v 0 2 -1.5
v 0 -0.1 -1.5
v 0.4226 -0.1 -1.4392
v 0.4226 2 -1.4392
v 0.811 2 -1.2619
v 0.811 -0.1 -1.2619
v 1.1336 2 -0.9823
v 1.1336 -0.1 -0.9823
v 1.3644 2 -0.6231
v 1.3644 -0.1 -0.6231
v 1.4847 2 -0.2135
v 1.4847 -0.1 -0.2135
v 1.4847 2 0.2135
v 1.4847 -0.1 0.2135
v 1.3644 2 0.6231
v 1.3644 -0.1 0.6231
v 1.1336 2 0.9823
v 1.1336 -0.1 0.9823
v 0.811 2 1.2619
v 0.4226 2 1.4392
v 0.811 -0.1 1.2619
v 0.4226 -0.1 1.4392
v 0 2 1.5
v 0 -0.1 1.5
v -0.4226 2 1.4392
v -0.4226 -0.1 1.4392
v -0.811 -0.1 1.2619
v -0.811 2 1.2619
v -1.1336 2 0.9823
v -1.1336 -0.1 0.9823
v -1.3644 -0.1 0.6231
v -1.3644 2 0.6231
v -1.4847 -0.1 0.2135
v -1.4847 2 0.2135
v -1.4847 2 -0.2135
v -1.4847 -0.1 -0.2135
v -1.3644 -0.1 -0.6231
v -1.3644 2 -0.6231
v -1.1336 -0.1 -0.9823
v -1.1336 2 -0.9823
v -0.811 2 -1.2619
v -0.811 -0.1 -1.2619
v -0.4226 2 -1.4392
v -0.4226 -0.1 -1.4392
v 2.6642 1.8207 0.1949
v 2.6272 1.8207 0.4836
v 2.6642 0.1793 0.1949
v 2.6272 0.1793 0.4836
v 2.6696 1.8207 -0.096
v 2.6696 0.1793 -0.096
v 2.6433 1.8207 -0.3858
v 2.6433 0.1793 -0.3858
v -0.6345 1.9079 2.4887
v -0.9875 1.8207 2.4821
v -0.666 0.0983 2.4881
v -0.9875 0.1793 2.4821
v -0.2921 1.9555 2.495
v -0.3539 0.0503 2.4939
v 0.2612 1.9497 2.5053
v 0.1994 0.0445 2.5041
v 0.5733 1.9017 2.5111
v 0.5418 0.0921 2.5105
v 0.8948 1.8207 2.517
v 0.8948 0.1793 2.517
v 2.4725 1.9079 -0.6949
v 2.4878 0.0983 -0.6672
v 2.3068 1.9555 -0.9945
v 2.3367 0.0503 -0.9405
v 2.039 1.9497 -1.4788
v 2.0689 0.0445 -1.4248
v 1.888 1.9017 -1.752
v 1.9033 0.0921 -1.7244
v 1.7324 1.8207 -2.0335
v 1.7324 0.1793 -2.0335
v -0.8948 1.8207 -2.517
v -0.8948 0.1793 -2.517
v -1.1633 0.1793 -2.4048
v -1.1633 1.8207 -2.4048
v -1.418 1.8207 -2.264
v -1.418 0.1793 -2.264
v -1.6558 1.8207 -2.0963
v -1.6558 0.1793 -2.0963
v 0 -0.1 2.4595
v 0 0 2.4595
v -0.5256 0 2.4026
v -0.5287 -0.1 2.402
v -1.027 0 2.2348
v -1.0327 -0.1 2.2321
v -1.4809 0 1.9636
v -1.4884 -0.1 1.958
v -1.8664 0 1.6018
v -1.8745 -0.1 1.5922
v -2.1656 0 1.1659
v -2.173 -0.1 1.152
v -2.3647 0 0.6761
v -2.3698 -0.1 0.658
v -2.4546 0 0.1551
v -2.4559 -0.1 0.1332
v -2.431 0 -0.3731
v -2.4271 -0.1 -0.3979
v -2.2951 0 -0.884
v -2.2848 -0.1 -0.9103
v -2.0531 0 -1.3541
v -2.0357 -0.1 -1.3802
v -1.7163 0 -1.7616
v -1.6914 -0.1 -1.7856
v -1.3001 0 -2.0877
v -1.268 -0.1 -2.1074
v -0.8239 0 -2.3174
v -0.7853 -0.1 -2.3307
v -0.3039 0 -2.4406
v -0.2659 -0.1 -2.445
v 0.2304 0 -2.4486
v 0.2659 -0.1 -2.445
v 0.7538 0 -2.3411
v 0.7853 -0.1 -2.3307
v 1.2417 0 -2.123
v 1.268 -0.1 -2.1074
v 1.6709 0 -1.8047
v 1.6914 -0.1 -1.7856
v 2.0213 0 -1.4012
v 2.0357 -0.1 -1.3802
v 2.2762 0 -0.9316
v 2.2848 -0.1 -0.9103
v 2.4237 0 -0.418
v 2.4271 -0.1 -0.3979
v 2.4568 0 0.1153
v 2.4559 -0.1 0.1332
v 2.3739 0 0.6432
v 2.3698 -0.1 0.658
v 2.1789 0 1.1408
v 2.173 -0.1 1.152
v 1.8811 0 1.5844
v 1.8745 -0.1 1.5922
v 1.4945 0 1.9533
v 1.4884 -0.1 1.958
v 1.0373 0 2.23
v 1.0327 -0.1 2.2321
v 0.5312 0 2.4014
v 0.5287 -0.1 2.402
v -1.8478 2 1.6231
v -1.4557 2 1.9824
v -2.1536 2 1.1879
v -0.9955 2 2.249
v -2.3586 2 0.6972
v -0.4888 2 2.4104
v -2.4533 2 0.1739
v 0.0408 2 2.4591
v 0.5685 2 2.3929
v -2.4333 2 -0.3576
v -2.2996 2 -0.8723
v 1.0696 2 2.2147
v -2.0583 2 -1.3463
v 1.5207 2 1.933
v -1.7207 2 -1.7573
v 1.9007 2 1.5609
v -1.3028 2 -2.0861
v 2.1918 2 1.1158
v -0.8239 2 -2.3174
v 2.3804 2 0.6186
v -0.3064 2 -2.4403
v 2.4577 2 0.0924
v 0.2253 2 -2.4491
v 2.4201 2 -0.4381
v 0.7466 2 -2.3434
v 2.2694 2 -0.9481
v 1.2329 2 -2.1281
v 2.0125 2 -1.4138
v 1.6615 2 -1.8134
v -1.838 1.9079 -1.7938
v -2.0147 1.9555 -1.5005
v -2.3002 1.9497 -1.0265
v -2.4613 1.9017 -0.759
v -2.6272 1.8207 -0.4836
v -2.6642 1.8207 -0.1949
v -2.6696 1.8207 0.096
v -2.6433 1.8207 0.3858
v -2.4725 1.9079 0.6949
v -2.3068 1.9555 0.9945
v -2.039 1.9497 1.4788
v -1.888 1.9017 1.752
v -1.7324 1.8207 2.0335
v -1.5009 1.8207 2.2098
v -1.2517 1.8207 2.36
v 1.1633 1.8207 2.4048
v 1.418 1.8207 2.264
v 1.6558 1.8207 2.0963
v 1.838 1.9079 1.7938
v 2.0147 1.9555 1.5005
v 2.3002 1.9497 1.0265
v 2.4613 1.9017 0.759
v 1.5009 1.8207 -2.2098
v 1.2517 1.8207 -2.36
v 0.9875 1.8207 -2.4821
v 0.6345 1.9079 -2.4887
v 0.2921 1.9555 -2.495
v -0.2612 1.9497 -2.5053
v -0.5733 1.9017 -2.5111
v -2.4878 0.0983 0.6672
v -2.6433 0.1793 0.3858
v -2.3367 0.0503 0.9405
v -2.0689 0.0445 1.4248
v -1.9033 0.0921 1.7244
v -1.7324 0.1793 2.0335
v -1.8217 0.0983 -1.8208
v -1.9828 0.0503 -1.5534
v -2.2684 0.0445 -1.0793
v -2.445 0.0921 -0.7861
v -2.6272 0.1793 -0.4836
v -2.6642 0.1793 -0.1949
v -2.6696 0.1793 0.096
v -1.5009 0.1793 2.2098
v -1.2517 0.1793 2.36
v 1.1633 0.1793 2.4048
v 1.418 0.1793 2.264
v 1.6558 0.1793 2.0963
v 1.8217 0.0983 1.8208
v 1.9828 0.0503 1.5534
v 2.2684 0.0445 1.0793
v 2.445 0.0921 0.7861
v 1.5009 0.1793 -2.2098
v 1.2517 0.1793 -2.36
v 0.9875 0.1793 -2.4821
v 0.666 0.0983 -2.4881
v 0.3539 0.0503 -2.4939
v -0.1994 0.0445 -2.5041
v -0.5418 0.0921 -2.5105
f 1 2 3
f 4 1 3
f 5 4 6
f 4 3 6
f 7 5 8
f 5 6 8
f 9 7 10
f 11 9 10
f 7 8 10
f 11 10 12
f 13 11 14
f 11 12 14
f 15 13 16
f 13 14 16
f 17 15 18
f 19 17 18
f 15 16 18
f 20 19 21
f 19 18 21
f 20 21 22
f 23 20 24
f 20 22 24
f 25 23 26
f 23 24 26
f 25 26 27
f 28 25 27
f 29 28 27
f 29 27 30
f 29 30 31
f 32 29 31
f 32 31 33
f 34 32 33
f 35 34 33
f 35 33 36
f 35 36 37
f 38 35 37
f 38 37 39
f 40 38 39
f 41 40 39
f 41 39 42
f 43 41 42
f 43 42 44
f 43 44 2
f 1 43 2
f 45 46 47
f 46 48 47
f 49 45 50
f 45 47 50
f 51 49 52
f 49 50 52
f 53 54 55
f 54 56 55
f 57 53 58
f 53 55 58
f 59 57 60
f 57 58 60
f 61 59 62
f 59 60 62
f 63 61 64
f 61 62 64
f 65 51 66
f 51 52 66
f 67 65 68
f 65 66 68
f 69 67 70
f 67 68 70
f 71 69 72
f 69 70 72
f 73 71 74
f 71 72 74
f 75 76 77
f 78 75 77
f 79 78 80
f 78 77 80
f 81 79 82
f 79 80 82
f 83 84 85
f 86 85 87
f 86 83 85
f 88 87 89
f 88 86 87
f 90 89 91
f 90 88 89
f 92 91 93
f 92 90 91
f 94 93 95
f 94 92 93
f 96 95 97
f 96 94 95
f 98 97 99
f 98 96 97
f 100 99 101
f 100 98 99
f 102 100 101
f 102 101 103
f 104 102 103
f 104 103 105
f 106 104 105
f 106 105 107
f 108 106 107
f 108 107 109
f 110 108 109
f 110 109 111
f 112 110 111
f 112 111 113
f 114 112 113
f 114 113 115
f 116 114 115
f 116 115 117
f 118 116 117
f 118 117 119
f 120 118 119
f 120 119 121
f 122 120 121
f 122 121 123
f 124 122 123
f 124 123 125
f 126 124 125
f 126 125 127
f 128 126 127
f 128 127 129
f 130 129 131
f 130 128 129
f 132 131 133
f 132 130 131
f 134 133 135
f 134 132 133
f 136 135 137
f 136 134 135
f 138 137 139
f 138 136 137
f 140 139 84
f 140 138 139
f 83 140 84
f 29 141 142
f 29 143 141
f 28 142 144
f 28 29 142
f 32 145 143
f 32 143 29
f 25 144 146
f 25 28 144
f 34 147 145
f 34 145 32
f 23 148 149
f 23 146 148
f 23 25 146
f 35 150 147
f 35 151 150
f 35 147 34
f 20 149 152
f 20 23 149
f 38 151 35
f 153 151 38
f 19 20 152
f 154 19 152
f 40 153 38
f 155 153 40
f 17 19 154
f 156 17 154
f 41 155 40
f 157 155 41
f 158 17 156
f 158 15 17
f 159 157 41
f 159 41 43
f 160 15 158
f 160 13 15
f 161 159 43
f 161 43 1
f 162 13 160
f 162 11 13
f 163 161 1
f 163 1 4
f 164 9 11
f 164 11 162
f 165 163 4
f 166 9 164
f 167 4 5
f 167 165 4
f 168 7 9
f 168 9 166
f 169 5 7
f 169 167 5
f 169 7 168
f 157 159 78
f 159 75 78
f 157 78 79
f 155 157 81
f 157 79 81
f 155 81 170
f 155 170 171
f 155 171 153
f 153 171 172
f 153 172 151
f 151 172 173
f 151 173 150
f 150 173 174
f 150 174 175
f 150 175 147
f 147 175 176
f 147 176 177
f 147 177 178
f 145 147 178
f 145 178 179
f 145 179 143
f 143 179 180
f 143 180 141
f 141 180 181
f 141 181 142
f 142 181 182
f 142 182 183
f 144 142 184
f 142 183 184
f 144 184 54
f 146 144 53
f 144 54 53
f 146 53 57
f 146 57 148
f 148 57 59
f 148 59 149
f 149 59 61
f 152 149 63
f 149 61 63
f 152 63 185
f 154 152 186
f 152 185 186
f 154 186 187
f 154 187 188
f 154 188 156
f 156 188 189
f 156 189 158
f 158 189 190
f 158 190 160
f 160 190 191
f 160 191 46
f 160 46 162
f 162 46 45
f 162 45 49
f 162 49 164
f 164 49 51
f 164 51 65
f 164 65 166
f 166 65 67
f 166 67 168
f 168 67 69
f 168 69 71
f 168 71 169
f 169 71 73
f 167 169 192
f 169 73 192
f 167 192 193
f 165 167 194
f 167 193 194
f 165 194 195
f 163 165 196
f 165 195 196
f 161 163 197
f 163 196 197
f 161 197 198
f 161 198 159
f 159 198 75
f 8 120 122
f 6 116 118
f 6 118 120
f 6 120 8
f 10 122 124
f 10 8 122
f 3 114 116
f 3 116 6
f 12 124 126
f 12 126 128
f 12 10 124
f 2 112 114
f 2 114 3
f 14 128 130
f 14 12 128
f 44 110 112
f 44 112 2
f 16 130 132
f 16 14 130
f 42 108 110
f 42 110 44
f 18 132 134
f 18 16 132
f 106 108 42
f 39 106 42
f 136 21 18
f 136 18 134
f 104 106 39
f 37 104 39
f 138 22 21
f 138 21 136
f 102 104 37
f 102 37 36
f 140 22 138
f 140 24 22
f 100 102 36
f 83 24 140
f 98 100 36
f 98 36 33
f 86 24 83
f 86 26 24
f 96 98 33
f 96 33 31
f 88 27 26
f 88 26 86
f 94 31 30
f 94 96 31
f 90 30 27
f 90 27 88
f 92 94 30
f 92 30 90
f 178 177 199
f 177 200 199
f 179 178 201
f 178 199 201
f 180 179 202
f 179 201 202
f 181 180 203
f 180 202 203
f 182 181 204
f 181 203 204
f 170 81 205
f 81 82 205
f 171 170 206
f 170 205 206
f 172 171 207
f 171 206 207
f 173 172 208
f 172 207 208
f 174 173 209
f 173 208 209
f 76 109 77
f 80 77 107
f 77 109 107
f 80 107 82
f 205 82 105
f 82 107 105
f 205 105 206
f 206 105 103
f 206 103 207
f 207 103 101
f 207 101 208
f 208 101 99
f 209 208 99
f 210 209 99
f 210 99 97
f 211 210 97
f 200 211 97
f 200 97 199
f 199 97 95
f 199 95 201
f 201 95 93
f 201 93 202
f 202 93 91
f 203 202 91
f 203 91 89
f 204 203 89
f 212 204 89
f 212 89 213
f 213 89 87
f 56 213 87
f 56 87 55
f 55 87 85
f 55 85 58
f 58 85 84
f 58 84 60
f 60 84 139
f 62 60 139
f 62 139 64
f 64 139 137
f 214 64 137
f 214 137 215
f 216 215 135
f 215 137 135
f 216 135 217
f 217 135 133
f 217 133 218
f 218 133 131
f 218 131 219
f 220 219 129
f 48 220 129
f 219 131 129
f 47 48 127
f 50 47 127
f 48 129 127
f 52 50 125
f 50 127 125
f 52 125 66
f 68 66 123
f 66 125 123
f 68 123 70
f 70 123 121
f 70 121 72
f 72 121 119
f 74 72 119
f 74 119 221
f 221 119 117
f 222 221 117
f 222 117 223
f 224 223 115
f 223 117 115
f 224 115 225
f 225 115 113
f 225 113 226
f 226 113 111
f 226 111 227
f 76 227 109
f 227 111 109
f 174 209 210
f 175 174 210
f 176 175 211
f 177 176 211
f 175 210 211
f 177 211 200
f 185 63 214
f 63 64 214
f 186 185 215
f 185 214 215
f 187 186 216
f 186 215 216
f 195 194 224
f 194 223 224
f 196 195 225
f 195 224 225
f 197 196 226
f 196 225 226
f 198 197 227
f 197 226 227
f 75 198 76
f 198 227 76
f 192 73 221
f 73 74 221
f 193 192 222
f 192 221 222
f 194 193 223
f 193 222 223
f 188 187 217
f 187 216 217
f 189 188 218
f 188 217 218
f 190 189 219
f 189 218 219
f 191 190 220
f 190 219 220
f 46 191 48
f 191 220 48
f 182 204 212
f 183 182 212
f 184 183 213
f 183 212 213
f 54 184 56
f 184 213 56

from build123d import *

# Parameters (mm, degrees)
BOSS_EXTRUDE1_DEPTH = 2
SKETCH2_R           = 1.5
CUT_EXTRUDE1_DEPTH  = 2.2
BOSS_EXTRUDE2_START = 0.1
SKETCH4_R           = 2.459458956
SKETCH4_R_2         = 1.5
BOSS_EXTRUDE2_DEPTH = 0.1


with BuildPart() as part:
    # Sketch1 → Boss-Extrude1 (new body)
    with BuildSketch(Plane(origin=(0, 0, 0), x_dir=(1, 0, 0), z_dir=(0, 1, 0))):
        Polygon((-1.396774529, 2.526332173), (-2.886255105, 0.053523861), (-1.489480575, -2.472808312), (1.396774529, -2.526332173), (2.886255105, -0.053523861), (1.489480575, 2.472808312), align=None)
    extrude(amount=BOSS_EXTRUDE1_DEPTH)

    # Sketch2 → Cut-Extrude1 (cut)
    with BuildSketch(Plane.XZ):
        with Locations(Location((0, 0, 0), (0, 0, 270))):
            Circle(SKETCH2_R)
    extrude(amount=-CUT_EXTRUDE1_DEPTH, mode=Mode.SUBTRACT)

    # Sketch3 → Cut-Revolve1 (revolve, cut)
    with BuildSketch(Plane(origin=(0, 0, 0), x_dir=(0, 0, -1), z_dir=(1, 0, 0)), mode=Mode.PRIVATE) as cut_revolve1_sk:
        Polygon((2.317459596, 2.120153304), (2.671353793, 1.820704368), (2.671353793, 0.179295632), (2.317459596, -0.120153304), (3.58564164, -0.304151817), (3.641464091, 2.445397761), align=None)
    revolve(cut_revolve1_sk.sketch.rotate(Axis((0, 0, 0), (0, 1, 0)), 19.570878152), axis=Axis((0, 0, 0), (0, 1, 0)), mode=Mode.SUBTRACT)

    # Sketch4 → Boss-Extrude2 (add)
    with BuildSketch(Plane.XZ.offset(BOSS_EXTRUDE2_START)):
        with Locations(Location((0, 0, 0), (0, 0, 90))):
            Circle(SKETCH4_R)
        with Locations(Location((0, 0, 0), (0, 0, 270))):
            Circle(SKETCH4_R_2, mode=Mode.SUBTRACT)
    extrude(amount=-BOSS_EXTRUDE2_DEPTH)


solid = part.part
